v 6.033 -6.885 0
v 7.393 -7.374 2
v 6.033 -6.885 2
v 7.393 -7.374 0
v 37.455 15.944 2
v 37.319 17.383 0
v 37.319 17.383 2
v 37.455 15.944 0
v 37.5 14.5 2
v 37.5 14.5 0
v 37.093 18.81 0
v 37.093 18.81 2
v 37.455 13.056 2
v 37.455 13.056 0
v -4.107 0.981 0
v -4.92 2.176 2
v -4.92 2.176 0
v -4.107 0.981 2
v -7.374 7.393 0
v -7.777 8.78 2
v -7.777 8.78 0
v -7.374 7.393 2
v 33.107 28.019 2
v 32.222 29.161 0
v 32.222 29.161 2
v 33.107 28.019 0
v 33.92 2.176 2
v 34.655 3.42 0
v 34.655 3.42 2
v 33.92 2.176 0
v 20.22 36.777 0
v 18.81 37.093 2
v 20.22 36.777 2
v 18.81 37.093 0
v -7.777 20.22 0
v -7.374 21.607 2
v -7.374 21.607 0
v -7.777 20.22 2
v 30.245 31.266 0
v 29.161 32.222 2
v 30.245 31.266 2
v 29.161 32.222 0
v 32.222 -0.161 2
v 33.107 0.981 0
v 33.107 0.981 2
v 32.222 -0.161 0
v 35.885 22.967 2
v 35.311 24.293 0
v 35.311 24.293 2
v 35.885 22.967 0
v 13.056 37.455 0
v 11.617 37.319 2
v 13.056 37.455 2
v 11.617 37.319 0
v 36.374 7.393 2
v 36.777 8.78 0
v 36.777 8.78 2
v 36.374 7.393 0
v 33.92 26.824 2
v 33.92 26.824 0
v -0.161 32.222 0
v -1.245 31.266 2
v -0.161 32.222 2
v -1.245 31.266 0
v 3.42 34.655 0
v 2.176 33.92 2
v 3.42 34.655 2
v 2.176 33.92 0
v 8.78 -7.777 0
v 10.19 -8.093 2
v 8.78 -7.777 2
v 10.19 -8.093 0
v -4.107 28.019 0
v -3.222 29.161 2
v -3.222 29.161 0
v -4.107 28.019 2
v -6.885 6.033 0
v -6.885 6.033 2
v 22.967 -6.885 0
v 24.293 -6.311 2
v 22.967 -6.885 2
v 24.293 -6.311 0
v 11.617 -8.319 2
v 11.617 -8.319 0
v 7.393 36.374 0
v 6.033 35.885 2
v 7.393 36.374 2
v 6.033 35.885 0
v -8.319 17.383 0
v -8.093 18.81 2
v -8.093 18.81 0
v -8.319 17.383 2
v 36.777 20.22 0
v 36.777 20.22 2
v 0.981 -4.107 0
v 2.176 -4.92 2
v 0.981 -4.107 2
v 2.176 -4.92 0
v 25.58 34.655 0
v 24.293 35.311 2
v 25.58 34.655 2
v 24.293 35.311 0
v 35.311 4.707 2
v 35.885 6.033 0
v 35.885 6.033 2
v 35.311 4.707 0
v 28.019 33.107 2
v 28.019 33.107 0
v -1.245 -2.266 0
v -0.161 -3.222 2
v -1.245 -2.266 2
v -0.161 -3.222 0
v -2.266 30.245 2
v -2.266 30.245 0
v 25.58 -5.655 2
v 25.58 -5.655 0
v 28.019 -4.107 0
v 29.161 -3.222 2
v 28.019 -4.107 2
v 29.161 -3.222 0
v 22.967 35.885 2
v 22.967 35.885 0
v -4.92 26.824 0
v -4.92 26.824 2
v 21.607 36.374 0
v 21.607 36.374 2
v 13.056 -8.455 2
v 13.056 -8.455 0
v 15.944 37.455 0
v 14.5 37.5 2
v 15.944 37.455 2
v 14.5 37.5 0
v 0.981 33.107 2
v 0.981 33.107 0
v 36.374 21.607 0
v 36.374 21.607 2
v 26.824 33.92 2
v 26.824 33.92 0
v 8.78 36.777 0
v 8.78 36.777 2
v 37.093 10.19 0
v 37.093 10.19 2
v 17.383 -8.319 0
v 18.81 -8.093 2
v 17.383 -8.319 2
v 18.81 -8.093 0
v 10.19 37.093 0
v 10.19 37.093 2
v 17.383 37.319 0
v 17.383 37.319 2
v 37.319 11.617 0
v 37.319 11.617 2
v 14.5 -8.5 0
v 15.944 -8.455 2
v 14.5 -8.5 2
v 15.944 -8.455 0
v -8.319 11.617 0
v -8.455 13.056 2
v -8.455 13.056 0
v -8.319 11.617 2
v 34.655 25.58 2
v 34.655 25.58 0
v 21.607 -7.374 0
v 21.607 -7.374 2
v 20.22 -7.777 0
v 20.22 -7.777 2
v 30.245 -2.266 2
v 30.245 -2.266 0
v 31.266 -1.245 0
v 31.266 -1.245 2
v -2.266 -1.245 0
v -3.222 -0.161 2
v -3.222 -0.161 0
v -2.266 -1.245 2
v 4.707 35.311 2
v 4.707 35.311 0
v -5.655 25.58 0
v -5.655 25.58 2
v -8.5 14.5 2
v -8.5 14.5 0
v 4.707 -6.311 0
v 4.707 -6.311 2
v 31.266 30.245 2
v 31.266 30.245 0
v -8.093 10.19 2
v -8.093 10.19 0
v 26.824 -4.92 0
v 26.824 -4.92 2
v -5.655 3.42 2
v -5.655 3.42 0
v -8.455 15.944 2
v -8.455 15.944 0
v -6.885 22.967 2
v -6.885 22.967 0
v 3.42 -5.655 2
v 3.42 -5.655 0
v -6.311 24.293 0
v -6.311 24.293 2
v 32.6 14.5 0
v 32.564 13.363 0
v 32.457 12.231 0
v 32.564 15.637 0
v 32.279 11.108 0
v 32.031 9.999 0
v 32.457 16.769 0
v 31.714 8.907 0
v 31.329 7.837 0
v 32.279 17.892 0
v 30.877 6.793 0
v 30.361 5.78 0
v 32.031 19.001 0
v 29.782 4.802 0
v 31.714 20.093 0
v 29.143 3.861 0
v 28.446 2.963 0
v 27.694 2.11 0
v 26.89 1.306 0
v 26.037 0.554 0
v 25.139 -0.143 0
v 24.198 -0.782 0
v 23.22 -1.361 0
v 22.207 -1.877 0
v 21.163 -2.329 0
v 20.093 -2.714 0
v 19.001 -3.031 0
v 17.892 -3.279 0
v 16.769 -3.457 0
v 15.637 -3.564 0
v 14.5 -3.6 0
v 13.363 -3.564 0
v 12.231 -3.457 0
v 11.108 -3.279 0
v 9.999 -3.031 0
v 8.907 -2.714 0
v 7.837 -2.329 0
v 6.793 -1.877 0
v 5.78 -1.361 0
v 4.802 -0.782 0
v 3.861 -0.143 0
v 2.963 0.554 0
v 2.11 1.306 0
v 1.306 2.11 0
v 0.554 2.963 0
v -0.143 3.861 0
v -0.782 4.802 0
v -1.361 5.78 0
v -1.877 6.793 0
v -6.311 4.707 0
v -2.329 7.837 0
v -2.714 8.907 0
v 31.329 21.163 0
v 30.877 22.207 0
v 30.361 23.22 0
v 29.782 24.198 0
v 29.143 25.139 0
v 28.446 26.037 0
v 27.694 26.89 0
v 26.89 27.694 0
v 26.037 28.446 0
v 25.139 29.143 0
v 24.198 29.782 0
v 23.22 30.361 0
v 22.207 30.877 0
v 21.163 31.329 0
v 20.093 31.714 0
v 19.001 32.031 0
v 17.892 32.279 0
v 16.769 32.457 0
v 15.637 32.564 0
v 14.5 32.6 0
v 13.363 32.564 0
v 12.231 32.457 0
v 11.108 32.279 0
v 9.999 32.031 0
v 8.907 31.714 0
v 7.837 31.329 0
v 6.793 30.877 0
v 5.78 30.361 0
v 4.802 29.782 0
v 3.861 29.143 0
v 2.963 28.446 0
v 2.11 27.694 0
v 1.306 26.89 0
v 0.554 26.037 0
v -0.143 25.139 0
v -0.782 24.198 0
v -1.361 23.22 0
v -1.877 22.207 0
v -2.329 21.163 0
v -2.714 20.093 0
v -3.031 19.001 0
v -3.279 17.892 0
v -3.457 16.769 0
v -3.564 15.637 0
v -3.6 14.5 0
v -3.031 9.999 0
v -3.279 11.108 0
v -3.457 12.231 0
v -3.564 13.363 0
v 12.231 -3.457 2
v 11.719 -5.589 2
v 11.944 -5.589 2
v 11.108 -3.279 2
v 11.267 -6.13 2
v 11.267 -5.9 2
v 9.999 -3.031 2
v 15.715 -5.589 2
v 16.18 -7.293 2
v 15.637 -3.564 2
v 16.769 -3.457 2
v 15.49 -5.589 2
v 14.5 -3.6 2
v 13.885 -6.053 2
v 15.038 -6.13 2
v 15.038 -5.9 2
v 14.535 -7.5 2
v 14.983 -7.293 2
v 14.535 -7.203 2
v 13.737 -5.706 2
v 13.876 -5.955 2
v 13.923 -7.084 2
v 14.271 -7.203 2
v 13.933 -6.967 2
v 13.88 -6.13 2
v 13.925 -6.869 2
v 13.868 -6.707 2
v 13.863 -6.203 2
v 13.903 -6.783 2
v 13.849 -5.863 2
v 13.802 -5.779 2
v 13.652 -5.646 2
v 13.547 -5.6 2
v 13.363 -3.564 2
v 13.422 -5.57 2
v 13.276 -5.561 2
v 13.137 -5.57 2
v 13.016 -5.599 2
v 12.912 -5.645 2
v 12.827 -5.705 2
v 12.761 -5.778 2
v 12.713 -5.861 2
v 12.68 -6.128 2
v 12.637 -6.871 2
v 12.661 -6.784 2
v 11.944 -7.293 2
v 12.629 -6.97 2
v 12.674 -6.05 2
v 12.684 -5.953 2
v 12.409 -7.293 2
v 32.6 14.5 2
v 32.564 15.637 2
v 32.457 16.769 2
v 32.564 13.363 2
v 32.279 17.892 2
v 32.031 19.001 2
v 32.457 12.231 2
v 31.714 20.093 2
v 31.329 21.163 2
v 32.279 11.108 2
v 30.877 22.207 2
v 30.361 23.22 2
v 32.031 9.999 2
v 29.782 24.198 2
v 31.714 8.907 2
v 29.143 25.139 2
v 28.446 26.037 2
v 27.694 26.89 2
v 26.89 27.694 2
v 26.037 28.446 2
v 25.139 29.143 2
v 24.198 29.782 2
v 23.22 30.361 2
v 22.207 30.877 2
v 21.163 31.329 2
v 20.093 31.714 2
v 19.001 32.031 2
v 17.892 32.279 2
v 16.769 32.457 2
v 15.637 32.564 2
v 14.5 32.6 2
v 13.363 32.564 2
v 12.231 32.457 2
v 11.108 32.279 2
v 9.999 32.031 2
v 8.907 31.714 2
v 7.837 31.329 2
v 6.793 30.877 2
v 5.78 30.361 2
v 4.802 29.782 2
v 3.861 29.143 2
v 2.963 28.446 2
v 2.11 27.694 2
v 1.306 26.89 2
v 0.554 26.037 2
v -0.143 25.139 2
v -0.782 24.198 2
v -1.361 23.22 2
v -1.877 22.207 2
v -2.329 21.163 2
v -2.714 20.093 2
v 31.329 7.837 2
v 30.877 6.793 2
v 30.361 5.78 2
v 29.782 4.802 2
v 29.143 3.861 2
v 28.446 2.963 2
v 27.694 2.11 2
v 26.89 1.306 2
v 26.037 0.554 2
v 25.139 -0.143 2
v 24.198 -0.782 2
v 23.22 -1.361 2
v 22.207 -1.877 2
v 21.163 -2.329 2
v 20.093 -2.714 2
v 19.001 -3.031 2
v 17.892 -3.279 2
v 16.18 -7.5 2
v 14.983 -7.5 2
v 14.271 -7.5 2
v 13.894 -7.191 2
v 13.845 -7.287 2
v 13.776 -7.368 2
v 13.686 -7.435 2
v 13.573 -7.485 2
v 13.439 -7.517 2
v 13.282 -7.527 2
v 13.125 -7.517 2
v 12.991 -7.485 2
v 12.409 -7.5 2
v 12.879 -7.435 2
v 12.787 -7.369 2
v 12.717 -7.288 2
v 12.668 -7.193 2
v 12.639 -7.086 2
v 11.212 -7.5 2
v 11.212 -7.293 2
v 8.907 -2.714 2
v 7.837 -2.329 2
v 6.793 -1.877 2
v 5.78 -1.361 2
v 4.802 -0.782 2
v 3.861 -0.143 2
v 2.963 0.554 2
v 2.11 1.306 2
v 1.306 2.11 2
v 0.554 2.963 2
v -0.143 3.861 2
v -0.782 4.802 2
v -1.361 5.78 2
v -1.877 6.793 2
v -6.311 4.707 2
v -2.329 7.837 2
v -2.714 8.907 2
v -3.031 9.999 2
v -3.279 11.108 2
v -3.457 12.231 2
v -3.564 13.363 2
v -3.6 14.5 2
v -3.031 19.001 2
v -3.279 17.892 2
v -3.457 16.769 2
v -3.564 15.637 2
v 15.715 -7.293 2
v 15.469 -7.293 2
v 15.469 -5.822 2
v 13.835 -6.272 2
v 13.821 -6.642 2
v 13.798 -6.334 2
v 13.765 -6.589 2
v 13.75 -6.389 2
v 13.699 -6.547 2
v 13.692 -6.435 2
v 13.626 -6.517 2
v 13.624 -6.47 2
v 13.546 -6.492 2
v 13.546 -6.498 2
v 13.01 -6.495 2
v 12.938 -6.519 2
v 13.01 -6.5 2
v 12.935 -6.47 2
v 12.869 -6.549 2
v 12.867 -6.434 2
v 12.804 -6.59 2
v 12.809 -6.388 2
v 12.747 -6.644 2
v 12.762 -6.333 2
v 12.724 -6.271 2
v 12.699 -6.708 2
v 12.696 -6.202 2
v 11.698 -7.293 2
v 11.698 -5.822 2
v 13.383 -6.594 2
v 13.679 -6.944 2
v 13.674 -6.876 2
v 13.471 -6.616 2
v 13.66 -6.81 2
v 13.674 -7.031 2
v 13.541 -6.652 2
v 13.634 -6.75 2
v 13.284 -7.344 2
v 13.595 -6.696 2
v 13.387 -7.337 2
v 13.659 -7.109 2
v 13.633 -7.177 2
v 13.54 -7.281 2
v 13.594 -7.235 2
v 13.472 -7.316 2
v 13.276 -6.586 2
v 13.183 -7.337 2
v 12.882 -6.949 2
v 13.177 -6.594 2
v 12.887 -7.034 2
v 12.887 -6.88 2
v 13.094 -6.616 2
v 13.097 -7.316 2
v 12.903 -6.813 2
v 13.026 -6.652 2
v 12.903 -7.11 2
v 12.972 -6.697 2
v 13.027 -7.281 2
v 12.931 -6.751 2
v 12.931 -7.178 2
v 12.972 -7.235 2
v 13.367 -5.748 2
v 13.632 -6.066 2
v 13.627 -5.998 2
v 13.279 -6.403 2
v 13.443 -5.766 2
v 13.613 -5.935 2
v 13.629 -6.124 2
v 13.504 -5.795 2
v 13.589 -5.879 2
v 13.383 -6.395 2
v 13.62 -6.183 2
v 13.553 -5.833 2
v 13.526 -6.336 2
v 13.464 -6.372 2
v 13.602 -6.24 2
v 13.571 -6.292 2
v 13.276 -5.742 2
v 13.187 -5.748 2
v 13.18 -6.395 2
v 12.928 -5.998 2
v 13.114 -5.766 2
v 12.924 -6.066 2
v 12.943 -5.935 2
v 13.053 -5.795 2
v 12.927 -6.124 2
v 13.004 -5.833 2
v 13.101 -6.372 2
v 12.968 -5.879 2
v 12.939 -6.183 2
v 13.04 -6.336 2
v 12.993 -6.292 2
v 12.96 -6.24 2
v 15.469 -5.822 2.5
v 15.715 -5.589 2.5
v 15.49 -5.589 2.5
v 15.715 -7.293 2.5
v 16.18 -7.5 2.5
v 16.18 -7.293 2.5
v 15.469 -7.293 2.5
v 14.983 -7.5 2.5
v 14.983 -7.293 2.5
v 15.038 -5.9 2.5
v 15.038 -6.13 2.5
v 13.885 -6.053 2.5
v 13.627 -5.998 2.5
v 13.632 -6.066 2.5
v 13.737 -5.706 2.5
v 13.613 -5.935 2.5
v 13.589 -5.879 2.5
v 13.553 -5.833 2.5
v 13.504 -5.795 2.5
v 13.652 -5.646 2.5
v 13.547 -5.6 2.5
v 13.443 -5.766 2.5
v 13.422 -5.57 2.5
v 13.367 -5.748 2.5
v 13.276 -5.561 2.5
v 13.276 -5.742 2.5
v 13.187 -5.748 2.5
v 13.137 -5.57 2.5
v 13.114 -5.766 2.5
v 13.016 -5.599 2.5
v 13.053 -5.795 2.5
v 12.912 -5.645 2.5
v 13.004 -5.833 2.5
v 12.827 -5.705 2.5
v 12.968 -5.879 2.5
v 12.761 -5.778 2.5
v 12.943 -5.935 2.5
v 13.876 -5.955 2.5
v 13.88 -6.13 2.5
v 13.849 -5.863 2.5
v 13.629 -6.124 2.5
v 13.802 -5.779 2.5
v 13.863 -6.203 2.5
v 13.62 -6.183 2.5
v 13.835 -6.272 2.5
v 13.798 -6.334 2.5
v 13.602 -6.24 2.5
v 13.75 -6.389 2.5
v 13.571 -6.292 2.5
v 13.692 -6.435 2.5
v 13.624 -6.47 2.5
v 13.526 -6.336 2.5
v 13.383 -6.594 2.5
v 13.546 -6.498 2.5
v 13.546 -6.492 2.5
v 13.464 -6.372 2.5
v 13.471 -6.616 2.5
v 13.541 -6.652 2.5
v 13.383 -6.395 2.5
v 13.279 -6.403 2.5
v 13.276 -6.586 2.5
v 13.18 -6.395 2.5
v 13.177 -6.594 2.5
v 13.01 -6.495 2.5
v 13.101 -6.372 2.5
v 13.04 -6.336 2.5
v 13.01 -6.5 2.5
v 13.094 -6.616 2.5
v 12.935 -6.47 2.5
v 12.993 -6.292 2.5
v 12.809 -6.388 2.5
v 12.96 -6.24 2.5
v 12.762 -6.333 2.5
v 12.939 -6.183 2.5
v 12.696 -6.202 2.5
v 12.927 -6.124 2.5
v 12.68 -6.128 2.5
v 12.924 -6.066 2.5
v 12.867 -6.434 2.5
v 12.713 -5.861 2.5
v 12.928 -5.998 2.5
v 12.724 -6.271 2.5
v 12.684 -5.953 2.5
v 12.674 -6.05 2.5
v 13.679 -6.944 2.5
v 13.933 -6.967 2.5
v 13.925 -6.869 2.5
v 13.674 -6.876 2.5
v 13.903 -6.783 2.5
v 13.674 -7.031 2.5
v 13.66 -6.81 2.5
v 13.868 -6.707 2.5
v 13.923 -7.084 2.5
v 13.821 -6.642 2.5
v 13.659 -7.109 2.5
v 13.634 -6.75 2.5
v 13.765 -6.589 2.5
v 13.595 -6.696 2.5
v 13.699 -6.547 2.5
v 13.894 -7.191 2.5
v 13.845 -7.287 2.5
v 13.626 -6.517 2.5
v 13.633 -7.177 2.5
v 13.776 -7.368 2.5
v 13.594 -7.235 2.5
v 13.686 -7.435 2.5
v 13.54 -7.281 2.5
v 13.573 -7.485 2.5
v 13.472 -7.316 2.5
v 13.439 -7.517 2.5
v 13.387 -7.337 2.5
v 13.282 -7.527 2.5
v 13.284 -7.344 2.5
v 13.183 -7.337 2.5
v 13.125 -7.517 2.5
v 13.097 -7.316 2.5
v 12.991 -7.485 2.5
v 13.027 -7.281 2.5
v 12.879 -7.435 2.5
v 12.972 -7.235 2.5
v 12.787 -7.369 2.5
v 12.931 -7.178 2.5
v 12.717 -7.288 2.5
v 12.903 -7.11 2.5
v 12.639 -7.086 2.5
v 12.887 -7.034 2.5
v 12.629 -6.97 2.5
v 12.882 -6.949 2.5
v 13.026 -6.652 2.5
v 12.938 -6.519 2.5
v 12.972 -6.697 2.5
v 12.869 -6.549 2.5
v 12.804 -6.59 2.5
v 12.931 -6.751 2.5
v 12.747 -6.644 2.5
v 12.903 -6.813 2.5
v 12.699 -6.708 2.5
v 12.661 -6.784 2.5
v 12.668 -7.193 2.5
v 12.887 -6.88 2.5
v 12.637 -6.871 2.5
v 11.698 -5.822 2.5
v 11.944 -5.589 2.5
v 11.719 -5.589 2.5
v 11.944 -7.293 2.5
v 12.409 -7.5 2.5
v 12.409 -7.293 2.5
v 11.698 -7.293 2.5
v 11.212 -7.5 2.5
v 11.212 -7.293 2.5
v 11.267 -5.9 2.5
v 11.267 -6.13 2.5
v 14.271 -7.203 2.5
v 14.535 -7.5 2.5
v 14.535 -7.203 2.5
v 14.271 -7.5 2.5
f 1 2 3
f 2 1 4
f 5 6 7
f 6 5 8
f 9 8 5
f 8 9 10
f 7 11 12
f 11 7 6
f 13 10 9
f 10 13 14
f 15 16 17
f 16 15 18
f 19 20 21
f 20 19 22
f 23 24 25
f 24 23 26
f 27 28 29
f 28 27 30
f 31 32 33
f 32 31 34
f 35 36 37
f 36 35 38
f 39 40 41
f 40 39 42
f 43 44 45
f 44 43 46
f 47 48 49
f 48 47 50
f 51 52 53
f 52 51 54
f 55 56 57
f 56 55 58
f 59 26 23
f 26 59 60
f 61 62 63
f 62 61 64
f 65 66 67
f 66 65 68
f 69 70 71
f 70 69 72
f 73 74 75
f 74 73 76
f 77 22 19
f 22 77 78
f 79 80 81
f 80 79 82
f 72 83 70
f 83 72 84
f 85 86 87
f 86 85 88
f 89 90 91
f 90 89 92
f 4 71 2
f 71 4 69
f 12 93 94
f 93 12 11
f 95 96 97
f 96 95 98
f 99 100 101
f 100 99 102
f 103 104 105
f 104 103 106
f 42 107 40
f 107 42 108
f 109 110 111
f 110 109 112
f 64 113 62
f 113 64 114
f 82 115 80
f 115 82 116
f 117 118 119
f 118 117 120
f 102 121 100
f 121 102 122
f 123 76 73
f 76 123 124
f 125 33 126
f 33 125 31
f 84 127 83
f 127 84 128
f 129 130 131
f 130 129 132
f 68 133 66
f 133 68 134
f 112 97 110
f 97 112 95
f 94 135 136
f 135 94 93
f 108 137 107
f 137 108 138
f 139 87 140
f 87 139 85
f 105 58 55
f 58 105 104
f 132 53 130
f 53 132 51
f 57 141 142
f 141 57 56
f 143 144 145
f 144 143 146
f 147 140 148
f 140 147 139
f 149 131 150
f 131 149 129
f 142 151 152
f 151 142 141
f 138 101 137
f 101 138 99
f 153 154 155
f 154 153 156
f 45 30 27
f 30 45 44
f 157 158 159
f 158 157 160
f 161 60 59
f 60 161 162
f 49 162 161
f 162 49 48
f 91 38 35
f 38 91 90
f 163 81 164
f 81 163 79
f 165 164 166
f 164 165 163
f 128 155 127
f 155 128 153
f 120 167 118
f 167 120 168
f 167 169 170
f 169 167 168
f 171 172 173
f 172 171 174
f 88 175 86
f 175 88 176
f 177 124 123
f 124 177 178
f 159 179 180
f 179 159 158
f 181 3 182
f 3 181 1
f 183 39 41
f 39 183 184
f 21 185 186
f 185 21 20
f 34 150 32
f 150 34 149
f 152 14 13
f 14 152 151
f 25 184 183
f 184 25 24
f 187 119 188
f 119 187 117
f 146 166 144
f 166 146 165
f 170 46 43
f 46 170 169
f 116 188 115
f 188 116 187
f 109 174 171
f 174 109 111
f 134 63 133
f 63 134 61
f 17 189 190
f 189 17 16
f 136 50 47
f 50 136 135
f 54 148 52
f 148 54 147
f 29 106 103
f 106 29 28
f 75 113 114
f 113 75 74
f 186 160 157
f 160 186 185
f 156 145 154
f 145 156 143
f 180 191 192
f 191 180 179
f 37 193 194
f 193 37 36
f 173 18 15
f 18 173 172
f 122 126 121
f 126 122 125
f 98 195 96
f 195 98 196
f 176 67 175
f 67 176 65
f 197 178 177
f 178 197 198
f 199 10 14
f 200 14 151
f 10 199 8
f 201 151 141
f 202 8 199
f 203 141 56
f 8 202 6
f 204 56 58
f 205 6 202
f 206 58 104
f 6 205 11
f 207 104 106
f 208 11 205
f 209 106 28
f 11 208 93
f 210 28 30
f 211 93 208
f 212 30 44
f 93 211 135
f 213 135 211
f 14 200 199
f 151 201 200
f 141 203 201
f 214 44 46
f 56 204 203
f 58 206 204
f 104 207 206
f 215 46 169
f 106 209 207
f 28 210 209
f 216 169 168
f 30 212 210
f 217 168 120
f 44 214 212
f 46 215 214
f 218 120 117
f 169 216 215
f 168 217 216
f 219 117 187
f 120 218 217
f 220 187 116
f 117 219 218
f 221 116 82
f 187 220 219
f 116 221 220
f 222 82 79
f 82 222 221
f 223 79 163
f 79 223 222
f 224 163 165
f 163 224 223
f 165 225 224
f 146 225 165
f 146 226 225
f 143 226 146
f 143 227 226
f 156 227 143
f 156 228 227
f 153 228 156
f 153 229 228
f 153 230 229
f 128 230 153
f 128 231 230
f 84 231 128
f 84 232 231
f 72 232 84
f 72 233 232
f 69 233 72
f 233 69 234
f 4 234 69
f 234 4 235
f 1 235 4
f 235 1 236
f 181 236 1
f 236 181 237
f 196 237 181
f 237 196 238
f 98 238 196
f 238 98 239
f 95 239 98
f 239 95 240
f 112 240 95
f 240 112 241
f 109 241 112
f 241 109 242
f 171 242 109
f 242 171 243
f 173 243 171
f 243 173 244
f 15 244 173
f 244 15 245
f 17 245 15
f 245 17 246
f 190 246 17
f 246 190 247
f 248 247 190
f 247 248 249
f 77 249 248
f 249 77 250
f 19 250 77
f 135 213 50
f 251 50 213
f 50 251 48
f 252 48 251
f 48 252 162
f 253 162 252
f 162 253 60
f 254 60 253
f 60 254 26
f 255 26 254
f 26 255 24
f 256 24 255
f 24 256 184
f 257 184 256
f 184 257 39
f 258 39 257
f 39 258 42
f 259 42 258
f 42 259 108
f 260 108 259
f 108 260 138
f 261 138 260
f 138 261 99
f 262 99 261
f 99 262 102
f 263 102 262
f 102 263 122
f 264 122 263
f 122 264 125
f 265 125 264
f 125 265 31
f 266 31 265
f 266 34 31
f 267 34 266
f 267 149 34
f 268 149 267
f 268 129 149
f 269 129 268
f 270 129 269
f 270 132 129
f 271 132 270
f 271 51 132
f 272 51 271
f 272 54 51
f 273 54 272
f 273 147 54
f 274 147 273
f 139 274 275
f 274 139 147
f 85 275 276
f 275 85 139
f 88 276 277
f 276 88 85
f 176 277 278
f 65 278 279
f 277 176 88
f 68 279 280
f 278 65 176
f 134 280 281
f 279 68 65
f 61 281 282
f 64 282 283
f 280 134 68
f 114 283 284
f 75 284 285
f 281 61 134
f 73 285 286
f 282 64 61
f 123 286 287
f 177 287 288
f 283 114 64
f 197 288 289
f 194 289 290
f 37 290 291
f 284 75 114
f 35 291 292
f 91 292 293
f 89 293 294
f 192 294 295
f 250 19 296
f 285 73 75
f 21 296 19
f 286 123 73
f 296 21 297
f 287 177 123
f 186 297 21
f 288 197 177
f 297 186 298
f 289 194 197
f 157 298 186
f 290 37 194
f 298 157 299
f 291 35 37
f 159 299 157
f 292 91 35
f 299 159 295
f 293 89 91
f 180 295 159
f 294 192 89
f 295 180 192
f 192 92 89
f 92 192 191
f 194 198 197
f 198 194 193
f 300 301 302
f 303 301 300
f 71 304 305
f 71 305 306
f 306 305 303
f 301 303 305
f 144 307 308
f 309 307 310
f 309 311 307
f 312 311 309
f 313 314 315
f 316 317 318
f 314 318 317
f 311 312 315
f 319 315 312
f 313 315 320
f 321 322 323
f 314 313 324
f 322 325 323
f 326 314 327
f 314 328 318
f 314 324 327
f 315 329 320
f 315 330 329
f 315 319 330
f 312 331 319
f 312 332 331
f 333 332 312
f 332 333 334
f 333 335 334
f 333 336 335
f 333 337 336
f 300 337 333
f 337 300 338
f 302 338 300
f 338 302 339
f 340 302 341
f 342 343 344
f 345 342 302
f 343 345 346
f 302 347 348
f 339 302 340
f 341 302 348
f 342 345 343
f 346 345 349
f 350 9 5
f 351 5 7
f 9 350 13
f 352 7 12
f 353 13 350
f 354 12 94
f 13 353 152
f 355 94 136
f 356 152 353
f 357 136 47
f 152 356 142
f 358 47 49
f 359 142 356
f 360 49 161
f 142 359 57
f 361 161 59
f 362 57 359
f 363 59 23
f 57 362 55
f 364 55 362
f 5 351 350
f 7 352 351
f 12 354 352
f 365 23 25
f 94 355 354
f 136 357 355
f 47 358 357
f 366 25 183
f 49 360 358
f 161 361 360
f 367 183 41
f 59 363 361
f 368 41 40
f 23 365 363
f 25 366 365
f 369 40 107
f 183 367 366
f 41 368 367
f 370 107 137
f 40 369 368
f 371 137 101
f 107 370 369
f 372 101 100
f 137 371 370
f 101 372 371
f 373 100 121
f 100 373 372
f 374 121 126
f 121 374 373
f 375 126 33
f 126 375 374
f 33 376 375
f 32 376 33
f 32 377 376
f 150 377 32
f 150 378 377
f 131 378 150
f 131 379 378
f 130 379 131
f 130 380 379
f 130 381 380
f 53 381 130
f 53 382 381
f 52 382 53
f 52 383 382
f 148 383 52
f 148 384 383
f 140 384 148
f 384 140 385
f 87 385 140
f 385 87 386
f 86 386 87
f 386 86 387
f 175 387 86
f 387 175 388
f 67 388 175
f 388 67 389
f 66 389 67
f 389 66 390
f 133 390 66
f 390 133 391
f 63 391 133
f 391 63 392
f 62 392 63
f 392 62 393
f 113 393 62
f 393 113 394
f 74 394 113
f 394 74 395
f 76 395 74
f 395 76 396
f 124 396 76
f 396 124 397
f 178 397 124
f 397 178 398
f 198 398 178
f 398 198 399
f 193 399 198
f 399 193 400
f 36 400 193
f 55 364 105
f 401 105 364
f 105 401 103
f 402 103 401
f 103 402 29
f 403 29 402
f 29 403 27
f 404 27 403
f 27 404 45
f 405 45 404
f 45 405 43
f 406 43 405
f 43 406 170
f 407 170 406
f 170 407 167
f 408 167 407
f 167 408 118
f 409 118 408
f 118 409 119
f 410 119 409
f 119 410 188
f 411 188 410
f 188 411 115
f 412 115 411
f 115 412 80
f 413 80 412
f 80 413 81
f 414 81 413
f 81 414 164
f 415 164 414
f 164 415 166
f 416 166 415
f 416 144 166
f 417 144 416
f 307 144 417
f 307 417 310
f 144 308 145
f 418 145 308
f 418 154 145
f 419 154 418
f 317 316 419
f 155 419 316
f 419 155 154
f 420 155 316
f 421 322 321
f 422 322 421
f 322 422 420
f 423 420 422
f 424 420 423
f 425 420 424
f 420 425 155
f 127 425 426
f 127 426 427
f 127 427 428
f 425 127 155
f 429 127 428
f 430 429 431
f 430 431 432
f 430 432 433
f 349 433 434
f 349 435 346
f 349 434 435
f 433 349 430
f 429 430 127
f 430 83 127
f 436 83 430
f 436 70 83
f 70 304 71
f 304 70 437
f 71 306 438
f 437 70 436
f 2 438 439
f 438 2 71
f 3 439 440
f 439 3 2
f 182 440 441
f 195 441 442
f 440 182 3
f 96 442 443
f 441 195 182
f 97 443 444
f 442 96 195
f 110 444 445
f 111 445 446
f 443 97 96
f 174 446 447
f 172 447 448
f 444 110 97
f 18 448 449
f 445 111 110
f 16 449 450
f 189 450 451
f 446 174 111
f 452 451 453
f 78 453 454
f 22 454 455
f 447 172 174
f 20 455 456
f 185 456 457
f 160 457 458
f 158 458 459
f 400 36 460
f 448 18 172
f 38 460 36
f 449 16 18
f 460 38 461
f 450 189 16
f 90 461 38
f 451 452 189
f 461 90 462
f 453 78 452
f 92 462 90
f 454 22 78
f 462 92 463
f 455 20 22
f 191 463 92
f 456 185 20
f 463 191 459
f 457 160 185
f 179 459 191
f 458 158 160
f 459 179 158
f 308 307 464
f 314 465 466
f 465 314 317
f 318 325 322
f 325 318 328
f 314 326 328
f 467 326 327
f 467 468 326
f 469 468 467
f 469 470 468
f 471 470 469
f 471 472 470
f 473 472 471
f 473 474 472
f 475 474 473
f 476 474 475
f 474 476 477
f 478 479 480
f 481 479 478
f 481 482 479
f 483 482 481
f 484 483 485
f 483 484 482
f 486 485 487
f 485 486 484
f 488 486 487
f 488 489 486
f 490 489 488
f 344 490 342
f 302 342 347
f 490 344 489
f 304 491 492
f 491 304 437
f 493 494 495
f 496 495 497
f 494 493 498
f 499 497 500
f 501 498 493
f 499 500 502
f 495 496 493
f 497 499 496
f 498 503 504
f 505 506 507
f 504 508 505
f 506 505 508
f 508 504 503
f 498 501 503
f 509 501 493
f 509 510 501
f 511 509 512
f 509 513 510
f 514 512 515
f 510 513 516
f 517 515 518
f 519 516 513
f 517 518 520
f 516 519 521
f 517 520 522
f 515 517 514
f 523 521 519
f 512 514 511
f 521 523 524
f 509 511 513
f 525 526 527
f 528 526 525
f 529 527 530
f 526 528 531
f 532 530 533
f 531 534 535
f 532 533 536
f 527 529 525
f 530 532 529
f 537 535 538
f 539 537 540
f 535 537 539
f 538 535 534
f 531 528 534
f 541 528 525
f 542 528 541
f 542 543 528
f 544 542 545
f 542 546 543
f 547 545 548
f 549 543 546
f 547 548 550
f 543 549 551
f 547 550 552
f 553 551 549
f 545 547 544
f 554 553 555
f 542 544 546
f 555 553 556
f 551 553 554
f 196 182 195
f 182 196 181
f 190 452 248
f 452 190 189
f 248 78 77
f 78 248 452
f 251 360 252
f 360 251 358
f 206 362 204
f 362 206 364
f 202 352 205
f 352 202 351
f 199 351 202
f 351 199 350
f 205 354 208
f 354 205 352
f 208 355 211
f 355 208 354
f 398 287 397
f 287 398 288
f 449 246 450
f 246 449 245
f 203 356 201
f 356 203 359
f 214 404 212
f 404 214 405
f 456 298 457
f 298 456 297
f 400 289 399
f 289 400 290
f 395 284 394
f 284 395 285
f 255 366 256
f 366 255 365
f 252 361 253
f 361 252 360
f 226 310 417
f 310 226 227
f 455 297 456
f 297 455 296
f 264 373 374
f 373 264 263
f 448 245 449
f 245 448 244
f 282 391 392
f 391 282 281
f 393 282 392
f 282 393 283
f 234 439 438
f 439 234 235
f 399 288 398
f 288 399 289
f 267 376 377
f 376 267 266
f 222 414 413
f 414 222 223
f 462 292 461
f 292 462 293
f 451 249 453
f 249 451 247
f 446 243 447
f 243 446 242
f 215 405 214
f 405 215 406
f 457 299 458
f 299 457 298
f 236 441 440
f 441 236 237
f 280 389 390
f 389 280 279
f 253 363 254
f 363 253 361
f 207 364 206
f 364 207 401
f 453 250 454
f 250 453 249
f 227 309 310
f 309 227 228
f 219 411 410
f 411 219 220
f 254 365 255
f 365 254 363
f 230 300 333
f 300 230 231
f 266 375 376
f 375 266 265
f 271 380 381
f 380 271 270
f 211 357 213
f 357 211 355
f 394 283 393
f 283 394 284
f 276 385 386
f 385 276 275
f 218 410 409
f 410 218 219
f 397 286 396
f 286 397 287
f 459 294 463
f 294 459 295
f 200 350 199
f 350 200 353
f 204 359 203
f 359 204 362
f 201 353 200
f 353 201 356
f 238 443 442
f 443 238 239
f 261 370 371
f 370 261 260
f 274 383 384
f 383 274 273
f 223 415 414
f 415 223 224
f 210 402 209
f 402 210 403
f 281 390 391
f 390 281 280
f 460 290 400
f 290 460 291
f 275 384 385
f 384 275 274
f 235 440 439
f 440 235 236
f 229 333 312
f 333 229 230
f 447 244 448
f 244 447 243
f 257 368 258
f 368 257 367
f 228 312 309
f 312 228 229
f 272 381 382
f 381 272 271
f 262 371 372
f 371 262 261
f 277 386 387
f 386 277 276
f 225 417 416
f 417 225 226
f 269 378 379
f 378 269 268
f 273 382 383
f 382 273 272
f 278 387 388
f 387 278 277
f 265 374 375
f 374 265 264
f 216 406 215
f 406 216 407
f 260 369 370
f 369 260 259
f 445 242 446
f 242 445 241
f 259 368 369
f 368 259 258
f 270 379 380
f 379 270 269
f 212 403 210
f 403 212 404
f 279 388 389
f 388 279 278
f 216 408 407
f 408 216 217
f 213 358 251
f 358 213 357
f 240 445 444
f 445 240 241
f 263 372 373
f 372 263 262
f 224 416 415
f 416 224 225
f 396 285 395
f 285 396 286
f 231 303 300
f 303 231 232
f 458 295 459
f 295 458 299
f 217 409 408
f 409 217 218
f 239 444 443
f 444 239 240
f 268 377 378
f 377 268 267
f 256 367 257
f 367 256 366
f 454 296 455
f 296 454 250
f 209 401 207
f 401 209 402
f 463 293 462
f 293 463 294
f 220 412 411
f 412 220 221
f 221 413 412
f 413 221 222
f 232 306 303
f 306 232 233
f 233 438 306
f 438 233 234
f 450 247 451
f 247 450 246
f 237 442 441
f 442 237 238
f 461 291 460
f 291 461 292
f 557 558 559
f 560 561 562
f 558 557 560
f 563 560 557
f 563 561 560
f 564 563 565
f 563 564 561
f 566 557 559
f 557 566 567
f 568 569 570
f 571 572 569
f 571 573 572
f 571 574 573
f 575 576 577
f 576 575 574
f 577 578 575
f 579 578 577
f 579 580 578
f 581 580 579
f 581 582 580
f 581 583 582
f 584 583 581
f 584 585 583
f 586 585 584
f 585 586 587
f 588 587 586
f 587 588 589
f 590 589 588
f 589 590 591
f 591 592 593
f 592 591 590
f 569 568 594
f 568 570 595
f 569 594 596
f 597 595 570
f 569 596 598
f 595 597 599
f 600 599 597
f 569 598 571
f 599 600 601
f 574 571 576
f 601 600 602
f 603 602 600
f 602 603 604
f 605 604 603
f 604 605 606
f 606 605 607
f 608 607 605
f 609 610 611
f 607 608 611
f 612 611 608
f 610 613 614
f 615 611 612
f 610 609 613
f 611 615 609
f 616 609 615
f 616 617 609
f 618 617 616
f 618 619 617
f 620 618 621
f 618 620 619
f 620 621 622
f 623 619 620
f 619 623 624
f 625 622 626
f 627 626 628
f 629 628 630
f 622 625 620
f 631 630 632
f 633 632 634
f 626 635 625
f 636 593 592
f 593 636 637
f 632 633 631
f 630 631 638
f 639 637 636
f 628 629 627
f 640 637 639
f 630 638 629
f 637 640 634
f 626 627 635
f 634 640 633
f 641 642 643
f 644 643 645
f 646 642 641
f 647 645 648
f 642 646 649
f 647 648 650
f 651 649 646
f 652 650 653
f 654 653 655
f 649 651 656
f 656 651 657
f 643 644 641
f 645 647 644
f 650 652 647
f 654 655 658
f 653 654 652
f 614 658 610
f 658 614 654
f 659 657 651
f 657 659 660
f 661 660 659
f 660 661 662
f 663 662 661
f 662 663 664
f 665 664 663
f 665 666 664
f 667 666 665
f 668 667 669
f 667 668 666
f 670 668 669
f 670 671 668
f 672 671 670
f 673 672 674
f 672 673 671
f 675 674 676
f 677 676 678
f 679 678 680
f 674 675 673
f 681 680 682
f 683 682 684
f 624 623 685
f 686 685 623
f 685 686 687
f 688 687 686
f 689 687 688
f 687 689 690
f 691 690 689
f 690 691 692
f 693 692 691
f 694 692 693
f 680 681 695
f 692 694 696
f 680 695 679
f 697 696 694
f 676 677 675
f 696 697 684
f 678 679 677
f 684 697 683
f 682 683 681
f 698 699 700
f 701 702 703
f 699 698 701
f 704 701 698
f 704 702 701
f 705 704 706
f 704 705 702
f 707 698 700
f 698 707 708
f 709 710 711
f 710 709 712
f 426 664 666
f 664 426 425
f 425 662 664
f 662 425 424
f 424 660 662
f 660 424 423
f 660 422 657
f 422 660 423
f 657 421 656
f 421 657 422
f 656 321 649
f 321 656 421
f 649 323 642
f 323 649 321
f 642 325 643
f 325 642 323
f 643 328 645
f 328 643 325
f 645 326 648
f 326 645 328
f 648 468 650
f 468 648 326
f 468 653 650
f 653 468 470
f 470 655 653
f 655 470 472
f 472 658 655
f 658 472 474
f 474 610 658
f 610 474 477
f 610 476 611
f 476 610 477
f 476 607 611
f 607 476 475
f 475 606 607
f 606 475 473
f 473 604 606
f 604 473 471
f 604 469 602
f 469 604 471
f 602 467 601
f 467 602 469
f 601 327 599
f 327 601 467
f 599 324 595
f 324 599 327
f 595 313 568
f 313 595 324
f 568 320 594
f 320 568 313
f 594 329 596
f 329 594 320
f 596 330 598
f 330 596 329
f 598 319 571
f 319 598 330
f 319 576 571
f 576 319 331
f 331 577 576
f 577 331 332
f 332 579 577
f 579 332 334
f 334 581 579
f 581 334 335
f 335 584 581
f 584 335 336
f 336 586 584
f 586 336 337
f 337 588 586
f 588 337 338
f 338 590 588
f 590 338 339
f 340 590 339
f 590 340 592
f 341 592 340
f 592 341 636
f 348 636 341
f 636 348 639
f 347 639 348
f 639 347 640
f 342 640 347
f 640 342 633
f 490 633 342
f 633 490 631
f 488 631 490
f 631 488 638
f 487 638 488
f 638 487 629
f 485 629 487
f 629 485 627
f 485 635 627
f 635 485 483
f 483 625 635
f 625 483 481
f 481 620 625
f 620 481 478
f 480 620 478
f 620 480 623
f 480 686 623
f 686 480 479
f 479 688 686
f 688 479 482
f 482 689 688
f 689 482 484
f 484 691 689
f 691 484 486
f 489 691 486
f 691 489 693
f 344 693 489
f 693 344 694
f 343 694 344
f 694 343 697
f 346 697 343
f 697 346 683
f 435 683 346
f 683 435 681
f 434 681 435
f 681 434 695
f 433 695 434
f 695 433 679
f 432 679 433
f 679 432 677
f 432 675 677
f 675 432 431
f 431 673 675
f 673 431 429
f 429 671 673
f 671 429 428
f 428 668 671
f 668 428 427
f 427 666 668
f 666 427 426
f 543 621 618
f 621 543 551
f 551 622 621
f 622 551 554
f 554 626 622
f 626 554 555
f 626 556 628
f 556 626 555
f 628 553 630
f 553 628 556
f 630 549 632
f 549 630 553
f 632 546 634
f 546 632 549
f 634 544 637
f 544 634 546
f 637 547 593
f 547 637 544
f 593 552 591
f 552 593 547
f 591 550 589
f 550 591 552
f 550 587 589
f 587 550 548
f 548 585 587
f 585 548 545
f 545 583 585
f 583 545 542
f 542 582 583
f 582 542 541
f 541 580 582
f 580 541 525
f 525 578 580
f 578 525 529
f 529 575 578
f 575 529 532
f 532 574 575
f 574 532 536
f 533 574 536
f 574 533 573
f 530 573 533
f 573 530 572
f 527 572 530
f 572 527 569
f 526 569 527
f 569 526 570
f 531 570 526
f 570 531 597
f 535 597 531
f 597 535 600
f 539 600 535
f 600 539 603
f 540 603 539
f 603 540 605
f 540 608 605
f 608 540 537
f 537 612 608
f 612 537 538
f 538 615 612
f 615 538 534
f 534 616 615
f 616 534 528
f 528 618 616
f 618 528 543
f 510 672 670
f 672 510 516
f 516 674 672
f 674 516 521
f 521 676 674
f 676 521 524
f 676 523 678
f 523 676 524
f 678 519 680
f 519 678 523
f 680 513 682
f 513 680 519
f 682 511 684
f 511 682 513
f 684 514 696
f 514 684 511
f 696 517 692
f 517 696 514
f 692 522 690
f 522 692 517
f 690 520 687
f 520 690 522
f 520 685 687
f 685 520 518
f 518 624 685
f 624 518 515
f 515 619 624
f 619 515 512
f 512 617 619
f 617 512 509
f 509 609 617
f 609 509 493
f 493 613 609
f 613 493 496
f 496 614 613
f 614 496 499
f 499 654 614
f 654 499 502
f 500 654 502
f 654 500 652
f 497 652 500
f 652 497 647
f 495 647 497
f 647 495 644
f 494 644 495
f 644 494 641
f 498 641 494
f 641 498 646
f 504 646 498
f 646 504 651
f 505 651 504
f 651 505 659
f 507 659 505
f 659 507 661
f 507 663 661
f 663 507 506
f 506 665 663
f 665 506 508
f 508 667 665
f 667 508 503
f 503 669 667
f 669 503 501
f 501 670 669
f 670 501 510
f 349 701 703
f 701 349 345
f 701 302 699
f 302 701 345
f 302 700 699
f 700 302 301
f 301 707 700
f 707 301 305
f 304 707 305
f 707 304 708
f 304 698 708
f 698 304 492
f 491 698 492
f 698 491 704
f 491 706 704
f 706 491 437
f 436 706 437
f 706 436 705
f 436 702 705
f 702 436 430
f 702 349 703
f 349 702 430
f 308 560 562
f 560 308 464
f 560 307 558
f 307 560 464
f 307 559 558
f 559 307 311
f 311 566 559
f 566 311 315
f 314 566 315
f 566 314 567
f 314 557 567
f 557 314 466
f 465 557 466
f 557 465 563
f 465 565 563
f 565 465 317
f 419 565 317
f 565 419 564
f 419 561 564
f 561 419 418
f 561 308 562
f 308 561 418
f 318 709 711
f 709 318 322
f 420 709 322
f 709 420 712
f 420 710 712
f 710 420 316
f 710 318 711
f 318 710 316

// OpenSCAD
//Lip
LipRadiusOuter=23;
LipRadiusInner=18.1;
LipHeight=2;
//matrix
rows = 1;
columns = 1;
LipDiameter = LipRadiusOuter * 2;
ModelSpacing = LipRadiusOuter -20;

module Lip()
{
    difference()
    color("Green")
    translate([LipRadiusOuter/2,LipRadiusOuter/2,0])
    difference()
    {
    cylinder($fn=100, LipHeight, LipRadiusOuter, LipRadiusOuter, false);
    translate([0,0,-1])
    cylinder($fn=100, LipHeight+2, LipRadiusInner, LipRadiusInner, false);    
    }
    linear_extrude(height = LipHeight+.5){translate([8,-10.5,LipHeight])text("18.1", 2);}
}    

module matrix()
{
    for(x=[1:columns], y=[1:rows])
    {
        //echo(x=x);echo(x=(ModelSpacing*(x) + (LipDiameter*(x-1)))); echo(y=0); echo();
        translate([
            ModelSpacing*(x) + (LipDiameter*(x-1)),
            ModelSpacing*(y) + (LipDiameter*(y-1)),
            0
        ])
        {
            Lip();
        }
    }
}
    
    
matrix();    
